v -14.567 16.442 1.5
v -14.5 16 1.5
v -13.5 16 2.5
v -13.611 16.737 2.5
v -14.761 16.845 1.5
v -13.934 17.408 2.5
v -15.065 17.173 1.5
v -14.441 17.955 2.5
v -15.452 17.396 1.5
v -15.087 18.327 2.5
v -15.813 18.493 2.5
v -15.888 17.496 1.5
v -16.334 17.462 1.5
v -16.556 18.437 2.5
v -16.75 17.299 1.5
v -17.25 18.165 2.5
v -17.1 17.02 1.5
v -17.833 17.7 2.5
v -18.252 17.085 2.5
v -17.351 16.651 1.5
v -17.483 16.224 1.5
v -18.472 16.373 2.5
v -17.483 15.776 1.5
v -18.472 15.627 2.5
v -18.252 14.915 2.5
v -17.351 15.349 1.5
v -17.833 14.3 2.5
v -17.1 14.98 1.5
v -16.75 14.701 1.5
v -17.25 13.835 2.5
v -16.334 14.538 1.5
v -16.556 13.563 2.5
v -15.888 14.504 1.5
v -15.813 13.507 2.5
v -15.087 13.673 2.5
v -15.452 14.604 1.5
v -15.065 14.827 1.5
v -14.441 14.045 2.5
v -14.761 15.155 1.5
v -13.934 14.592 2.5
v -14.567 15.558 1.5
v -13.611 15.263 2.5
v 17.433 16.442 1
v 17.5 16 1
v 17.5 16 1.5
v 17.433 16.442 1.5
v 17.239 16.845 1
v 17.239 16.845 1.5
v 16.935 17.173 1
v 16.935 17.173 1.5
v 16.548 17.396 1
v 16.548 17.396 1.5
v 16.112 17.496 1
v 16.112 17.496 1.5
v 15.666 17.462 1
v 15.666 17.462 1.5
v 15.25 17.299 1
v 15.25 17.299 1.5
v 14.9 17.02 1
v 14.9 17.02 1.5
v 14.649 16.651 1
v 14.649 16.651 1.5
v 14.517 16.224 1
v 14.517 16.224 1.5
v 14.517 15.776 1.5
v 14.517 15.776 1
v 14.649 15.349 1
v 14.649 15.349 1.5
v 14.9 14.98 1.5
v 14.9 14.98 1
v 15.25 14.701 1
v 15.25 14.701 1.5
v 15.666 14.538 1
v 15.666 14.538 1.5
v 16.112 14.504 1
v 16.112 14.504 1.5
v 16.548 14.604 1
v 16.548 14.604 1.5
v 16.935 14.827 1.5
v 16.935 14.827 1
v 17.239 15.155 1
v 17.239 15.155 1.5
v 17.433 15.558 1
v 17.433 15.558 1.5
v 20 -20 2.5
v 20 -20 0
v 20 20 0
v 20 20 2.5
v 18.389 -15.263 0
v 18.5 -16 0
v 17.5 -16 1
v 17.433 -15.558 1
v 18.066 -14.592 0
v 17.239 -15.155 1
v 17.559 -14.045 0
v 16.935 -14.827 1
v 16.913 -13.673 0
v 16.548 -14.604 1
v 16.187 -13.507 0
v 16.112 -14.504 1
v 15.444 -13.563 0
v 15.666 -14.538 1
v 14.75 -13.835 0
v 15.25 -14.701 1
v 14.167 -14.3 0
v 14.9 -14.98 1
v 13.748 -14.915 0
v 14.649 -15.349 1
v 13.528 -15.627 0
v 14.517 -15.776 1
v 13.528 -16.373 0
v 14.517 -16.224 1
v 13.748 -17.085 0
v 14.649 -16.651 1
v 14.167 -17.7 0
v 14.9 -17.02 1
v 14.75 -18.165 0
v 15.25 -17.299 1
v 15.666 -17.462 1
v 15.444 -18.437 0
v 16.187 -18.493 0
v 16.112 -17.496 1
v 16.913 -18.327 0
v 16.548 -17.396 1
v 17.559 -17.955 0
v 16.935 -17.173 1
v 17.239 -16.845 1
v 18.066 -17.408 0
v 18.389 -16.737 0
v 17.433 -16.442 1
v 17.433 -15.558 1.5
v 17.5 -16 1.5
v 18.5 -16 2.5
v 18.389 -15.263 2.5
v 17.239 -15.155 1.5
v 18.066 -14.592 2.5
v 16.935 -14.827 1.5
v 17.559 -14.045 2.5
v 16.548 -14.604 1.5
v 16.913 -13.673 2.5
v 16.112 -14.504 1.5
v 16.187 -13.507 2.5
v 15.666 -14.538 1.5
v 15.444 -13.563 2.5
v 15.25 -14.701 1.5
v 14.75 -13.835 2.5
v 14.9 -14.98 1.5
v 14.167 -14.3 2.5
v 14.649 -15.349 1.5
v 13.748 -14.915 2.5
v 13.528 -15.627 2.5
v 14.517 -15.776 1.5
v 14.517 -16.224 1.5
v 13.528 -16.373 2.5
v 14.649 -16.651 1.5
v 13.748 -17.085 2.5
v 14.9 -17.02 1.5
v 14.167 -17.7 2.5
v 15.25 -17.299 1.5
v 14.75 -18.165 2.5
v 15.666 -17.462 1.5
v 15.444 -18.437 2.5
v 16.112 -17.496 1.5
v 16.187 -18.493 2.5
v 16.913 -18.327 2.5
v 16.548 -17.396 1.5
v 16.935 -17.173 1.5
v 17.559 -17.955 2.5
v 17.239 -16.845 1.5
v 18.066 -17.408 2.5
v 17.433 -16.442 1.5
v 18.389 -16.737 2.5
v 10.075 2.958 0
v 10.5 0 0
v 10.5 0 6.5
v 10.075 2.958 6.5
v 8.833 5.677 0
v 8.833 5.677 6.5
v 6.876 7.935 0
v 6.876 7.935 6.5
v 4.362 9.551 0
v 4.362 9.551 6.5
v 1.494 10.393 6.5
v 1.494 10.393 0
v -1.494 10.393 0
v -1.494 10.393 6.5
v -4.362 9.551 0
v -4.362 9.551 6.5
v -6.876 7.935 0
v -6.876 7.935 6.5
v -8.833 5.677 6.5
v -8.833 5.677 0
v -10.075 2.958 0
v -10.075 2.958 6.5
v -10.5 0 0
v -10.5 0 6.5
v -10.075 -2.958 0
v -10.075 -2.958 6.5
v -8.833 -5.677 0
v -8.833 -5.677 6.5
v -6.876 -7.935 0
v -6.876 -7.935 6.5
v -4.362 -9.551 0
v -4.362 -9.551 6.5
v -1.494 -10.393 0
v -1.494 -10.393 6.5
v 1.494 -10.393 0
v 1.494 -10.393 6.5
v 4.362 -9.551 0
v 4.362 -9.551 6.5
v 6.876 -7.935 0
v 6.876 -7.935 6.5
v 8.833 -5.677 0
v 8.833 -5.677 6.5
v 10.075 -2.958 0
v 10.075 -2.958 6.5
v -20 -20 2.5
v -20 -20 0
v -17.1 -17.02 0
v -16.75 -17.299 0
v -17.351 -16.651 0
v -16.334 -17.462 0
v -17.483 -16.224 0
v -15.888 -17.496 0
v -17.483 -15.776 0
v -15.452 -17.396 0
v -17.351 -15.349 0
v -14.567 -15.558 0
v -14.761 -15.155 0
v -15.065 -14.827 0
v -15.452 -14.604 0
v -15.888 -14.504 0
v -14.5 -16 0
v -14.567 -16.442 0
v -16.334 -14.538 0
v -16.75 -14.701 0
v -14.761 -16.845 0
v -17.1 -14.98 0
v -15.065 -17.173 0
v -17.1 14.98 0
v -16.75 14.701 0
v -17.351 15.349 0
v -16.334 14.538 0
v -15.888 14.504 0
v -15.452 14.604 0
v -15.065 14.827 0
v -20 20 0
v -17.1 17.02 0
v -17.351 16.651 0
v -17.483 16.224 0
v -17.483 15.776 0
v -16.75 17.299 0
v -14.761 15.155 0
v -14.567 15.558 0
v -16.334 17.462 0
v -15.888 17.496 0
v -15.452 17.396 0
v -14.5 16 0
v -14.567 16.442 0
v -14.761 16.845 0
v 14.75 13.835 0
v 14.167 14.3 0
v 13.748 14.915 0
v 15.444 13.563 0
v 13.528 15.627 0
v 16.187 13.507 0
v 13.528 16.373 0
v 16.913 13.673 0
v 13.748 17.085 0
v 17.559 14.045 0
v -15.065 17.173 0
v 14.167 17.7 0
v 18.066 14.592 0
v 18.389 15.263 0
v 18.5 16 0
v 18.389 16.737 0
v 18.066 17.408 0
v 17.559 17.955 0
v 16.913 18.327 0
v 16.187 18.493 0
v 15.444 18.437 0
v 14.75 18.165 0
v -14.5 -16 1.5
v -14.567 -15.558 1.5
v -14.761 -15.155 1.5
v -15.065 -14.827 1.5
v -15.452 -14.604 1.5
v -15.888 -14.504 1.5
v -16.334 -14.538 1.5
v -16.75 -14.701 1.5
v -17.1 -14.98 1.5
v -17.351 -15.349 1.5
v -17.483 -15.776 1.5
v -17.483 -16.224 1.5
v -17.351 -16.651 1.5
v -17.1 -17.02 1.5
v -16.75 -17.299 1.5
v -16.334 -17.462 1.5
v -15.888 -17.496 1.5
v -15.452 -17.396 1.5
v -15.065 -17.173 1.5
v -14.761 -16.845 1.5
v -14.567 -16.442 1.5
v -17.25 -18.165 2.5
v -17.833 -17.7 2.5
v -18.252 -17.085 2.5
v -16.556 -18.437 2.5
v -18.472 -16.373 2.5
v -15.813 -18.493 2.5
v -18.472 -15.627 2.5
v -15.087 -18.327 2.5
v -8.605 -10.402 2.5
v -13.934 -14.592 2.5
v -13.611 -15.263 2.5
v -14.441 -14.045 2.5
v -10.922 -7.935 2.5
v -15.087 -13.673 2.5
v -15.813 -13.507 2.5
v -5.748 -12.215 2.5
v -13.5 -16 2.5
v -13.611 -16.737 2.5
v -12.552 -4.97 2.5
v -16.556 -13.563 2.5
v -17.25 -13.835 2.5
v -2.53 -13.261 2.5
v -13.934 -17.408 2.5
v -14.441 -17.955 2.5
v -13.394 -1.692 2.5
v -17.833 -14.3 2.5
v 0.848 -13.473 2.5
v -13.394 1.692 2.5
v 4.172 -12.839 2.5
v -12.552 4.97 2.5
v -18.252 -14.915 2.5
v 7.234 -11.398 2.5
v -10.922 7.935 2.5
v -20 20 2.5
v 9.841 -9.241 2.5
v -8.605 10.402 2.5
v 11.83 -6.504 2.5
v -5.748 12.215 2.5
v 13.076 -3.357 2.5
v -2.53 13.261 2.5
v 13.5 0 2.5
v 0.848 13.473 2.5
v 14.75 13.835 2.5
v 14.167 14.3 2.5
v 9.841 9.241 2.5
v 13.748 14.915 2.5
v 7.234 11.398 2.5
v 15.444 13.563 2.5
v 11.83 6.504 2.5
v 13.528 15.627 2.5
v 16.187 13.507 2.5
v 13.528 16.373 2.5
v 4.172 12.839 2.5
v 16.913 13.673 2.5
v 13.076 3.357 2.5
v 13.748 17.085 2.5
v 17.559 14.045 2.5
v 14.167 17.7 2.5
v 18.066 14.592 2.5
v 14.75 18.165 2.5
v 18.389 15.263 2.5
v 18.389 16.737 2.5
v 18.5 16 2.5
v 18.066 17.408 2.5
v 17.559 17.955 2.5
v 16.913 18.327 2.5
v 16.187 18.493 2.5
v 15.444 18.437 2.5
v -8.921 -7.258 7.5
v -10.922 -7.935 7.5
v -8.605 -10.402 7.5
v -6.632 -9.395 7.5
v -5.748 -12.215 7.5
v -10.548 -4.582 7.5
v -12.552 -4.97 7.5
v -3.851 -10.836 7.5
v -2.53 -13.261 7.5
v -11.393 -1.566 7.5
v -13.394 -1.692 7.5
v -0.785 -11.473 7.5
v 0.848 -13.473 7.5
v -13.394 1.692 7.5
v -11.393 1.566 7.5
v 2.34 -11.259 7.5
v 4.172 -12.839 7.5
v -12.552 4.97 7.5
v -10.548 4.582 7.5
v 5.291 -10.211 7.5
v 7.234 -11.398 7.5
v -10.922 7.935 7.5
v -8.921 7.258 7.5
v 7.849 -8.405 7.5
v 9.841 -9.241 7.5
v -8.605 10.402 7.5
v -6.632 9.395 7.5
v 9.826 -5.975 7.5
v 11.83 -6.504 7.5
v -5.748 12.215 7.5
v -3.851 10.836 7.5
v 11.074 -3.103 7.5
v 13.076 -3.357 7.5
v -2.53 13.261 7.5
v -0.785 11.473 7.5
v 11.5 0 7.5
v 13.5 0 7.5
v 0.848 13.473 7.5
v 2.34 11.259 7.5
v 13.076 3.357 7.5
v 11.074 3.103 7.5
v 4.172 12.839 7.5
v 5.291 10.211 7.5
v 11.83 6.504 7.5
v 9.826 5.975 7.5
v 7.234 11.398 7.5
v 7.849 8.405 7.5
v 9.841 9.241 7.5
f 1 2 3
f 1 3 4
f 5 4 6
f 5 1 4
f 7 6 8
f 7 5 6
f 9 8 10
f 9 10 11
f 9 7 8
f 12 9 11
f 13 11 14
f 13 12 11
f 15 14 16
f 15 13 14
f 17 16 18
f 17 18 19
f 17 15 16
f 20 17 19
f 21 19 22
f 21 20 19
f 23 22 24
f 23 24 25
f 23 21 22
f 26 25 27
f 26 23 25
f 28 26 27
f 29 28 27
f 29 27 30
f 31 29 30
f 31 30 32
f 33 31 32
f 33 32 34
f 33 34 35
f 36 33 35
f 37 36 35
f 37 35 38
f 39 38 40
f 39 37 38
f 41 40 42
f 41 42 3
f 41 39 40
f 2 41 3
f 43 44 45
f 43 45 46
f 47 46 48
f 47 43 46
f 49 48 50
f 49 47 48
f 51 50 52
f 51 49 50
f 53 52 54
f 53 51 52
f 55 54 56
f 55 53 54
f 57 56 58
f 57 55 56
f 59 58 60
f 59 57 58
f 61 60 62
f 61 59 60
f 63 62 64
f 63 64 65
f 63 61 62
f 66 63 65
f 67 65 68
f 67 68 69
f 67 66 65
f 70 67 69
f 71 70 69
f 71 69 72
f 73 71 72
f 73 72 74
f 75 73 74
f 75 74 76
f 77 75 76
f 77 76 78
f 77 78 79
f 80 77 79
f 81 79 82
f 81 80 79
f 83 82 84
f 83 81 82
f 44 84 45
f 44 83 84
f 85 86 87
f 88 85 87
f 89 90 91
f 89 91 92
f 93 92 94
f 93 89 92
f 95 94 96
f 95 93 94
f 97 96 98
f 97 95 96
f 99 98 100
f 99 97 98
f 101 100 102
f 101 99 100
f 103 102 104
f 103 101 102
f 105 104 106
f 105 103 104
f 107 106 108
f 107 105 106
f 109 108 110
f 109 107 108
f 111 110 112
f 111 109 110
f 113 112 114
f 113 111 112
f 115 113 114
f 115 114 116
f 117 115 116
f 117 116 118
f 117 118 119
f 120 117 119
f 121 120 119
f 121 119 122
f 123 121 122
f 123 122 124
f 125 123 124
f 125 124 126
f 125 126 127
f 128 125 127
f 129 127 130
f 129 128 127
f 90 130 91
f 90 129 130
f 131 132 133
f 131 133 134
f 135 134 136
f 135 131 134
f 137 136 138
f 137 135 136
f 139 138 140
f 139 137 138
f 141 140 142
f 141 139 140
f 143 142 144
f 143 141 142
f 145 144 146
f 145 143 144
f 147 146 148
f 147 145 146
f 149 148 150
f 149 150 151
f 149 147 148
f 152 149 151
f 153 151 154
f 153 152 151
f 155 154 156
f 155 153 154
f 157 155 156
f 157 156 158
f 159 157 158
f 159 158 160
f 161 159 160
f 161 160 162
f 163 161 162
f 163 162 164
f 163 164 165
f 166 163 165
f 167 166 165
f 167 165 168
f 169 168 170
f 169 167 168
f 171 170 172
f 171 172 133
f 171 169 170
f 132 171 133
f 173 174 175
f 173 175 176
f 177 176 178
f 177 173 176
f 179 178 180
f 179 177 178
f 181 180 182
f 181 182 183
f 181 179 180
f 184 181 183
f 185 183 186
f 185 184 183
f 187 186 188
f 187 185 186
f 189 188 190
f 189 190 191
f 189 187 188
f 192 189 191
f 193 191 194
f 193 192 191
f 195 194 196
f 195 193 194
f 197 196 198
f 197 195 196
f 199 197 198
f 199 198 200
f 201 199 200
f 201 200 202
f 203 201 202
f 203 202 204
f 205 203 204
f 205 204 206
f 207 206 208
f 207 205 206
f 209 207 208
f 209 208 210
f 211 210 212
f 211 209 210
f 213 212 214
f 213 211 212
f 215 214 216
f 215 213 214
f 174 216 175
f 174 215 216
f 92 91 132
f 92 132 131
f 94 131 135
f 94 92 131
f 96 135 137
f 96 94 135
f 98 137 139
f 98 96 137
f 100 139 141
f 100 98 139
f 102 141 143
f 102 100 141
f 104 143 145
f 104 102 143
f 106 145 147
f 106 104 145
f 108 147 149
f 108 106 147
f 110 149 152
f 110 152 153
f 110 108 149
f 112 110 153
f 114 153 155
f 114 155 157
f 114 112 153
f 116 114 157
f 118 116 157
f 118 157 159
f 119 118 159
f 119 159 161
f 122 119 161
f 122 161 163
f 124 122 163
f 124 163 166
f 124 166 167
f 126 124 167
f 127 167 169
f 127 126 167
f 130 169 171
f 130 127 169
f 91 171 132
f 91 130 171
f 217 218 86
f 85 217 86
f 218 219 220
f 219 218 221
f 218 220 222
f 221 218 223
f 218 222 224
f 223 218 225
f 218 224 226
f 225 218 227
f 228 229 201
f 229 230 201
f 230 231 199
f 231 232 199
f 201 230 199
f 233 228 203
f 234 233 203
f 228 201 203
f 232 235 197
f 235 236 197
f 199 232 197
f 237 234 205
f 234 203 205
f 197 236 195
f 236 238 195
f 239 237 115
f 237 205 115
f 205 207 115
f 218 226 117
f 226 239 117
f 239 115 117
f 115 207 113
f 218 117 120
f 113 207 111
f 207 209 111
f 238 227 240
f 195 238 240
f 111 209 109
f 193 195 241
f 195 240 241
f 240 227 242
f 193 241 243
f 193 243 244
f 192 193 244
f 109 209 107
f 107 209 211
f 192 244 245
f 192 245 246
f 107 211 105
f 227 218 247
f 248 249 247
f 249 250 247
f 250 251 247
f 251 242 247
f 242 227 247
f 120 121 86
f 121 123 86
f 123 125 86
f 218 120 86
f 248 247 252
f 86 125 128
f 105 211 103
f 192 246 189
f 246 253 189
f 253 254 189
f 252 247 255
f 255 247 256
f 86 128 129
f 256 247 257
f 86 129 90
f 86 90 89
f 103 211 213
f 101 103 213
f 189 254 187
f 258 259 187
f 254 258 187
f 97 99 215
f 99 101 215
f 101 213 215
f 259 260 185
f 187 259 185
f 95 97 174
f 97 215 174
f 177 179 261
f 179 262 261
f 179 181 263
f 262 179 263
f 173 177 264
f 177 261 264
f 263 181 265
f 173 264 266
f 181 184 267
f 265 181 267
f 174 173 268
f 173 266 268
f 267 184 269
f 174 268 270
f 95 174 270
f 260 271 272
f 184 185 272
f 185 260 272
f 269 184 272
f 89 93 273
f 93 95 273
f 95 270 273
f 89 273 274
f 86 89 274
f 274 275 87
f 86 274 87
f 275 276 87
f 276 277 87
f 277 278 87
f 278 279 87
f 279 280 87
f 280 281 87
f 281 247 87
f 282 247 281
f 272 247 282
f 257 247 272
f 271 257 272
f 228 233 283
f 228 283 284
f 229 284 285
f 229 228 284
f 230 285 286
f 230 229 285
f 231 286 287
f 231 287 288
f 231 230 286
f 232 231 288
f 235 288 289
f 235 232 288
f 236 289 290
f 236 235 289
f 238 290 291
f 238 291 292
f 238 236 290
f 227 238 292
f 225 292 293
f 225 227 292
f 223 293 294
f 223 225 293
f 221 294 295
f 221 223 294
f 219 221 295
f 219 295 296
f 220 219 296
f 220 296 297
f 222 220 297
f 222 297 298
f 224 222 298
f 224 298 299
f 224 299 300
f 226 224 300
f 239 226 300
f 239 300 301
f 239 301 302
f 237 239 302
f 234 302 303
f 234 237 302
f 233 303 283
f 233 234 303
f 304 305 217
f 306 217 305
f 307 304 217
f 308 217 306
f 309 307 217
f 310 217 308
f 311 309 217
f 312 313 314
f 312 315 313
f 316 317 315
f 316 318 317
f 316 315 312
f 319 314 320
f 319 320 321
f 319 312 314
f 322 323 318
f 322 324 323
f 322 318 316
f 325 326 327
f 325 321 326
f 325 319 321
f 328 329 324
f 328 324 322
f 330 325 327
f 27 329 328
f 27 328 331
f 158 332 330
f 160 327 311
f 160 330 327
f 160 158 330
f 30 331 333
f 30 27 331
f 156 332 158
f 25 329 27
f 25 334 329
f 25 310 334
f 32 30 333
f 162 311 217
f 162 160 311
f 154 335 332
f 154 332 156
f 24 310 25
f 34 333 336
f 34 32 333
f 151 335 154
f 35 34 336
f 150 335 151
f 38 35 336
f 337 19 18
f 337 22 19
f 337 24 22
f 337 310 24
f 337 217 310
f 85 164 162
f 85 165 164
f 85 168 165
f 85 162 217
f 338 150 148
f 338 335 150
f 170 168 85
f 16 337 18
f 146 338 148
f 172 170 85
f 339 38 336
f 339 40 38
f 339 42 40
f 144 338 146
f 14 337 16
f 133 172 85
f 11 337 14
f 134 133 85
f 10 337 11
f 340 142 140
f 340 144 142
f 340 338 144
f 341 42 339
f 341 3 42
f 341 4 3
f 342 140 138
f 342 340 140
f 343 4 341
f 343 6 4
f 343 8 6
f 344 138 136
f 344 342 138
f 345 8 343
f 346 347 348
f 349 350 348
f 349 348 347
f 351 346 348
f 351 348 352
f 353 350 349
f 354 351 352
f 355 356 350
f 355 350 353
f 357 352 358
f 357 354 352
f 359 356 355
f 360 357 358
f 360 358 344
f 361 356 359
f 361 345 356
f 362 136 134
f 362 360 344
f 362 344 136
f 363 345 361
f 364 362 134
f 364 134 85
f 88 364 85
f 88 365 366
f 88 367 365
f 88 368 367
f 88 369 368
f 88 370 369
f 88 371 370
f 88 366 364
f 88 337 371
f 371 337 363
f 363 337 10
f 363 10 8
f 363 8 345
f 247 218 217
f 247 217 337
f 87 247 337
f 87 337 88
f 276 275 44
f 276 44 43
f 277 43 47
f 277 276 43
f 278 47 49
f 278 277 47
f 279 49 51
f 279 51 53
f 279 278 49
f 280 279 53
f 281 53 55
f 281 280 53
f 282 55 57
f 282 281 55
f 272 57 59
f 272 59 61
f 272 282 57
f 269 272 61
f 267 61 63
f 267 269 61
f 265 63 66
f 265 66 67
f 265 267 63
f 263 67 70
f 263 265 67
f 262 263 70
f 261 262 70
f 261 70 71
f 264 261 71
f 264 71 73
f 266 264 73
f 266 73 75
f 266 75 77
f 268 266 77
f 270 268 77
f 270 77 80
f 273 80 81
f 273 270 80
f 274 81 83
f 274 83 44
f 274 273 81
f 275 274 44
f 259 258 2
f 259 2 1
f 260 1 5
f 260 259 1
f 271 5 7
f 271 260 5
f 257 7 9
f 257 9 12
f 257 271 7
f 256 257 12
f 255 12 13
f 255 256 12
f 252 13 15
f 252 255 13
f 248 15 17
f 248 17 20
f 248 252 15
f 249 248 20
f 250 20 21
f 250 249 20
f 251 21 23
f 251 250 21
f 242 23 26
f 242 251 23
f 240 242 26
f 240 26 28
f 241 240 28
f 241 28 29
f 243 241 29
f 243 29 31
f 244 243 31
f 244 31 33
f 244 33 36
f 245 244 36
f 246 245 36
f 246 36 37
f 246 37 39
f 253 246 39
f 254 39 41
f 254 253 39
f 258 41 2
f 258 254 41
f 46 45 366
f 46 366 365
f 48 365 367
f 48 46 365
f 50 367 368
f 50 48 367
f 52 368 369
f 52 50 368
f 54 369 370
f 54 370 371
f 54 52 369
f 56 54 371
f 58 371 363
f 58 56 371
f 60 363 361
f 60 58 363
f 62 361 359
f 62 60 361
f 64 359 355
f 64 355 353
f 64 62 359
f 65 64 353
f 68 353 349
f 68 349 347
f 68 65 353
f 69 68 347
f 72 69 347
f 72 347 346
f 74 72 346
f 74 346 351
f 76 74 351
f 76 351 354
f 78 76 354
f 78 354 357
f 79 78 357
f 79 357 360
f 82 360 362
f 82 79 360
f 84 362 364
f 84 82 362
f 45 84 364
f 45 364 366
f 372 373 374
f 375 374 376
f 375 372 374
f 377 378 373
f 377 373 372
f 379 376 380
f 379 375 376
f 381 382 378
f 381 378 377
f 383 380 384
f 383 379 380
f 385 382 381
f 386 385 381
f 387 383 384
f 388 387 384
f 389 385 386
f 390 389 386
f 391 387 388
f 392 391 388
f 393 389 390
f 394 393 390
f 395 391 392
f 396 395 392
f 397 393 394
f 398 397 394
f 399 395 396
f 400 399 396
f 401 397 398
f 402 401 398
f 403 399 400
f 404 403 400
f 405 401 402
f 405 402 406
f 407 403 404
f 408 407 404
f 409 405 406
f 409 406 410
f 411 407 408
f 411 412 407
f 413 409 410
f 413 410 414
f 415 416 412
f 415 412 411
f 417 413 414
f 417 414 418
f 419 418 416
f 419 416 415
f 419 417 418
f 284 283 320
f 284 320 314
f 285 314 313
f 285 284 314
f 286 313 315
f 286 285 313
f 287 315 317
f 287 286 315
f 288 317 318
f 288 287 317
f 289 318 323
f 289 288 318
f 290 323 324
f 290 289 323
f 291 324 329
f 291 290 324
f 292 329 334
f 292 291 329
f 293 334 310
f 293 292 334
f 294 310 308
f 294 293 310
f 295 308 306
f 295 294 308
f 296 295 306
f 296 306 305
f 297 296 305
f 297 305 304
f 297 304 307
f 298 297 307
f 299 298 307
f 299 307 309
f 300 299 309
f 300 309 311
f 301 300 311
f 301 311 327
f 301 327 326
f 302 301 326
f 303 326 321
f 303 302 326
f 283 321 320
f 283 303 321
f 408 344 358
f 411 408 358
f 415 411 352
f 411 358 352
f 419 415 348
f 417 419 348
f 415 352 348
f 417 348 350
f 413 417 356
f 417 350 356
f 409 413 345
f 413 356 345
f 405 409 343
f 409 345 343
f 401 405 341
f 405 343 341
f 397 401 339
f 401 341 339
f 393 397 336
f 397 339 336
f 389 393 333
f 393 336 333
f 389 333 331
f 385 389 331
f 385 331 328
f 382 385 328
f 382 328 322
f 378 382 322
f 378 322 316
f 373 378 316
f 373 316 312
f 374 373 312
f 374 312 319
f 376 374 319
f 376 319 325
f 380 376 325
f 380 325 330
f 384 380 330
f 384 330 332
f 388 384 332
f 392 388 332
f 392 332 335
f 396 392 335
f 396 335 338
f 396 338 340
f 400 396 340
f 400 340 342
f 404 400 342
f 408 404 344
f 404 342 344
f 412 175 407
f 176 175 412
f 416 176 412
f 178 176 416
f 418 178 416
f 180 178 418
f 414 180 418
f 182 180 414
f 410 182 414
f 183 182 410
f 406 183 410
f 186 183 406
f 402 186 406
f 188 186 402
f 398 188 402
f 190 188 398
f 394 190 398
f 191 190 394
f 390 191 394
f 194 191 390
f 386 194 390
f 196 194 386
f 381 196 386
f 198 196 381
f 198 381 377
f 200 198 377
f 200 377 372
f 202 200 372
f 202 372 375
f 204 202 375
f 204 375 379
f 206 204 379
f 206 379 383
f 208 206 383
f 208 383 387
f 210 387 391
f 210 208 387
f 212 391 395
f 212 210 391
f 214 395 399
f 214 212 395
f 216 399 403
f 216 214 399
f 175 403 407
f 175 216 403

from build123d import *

# Parameters (mm, degrees)
F0_W     = 40
F0_H     = 40
F0_R     = 1.5
F0_R_2   = 13.5
F1_DEPTH = 2.5
F0_R_3   = 10.5
F2_DEPTH = 7.5
F3_SIZE  = 1
F4_SIZE  = 1
F5_SIZE  = 1


with BuildPart() as f1:
    # F0 (on Top) → F1 (new body)
    with BuildSketch(Plane.XY):
        Rectangle(F0_W, F0_H)
        with Locations((-16, -16)):
            Circle(F0_R, mode=Mode.SUBTRACT)
        with Locations((16, -16)):
            Circle(F0_R, mode=Mode.SUBTRACT)
        with Locations((-16, 16)):
            Circle(F0_R, mode=Mode.SUBTRACT)
        Circle(F0_R_2, mode=Mode.SUBTRACT)
        with Locations((16, 16)):
            Circle(F0_R, mode=Mode.SUBTRACT)
    extrude(amount=F1_DEPTH)

    # F0 (on Top) → F2 (join)
    with BuildSketch(Plane.XY):
        Circle(F0_R_2)
        Circle(F0_R_3, mode=Mode.SUBTRACT)
    extrude(amount=F2_DEPTH)

    # F3
    f3_edges = [f1.edges().sort_by_distance(p)[0] for p in [
        (-10.5, 0, 7.5),
    ]]
    chamfer(f3_edges, length=F3_SIZE)

    # F4
    f4_edges = [f1.edges().sort_by_distance(p)[0] for p in [
        (-17.5, -16, 2.5),
    ]]
    chamfer(f4_edges, length=F4_SIZE)

    # F5
    f5_edges = [f1.edges().sort_by_distance(p)[0] for p in [
        (17.5, -16, 1.25),
        (14.5, -16, 0),
        (14.5, -16, 2.5),
        (17.5, 16, 1.25),
        (14.5, 16, 0),
        (14.5, 16, 2.5),
        (-17.5, 16, 2.5),
    ]]
    chamfer(f5_edges, length=F5_SIZE)


solid = f1.part
